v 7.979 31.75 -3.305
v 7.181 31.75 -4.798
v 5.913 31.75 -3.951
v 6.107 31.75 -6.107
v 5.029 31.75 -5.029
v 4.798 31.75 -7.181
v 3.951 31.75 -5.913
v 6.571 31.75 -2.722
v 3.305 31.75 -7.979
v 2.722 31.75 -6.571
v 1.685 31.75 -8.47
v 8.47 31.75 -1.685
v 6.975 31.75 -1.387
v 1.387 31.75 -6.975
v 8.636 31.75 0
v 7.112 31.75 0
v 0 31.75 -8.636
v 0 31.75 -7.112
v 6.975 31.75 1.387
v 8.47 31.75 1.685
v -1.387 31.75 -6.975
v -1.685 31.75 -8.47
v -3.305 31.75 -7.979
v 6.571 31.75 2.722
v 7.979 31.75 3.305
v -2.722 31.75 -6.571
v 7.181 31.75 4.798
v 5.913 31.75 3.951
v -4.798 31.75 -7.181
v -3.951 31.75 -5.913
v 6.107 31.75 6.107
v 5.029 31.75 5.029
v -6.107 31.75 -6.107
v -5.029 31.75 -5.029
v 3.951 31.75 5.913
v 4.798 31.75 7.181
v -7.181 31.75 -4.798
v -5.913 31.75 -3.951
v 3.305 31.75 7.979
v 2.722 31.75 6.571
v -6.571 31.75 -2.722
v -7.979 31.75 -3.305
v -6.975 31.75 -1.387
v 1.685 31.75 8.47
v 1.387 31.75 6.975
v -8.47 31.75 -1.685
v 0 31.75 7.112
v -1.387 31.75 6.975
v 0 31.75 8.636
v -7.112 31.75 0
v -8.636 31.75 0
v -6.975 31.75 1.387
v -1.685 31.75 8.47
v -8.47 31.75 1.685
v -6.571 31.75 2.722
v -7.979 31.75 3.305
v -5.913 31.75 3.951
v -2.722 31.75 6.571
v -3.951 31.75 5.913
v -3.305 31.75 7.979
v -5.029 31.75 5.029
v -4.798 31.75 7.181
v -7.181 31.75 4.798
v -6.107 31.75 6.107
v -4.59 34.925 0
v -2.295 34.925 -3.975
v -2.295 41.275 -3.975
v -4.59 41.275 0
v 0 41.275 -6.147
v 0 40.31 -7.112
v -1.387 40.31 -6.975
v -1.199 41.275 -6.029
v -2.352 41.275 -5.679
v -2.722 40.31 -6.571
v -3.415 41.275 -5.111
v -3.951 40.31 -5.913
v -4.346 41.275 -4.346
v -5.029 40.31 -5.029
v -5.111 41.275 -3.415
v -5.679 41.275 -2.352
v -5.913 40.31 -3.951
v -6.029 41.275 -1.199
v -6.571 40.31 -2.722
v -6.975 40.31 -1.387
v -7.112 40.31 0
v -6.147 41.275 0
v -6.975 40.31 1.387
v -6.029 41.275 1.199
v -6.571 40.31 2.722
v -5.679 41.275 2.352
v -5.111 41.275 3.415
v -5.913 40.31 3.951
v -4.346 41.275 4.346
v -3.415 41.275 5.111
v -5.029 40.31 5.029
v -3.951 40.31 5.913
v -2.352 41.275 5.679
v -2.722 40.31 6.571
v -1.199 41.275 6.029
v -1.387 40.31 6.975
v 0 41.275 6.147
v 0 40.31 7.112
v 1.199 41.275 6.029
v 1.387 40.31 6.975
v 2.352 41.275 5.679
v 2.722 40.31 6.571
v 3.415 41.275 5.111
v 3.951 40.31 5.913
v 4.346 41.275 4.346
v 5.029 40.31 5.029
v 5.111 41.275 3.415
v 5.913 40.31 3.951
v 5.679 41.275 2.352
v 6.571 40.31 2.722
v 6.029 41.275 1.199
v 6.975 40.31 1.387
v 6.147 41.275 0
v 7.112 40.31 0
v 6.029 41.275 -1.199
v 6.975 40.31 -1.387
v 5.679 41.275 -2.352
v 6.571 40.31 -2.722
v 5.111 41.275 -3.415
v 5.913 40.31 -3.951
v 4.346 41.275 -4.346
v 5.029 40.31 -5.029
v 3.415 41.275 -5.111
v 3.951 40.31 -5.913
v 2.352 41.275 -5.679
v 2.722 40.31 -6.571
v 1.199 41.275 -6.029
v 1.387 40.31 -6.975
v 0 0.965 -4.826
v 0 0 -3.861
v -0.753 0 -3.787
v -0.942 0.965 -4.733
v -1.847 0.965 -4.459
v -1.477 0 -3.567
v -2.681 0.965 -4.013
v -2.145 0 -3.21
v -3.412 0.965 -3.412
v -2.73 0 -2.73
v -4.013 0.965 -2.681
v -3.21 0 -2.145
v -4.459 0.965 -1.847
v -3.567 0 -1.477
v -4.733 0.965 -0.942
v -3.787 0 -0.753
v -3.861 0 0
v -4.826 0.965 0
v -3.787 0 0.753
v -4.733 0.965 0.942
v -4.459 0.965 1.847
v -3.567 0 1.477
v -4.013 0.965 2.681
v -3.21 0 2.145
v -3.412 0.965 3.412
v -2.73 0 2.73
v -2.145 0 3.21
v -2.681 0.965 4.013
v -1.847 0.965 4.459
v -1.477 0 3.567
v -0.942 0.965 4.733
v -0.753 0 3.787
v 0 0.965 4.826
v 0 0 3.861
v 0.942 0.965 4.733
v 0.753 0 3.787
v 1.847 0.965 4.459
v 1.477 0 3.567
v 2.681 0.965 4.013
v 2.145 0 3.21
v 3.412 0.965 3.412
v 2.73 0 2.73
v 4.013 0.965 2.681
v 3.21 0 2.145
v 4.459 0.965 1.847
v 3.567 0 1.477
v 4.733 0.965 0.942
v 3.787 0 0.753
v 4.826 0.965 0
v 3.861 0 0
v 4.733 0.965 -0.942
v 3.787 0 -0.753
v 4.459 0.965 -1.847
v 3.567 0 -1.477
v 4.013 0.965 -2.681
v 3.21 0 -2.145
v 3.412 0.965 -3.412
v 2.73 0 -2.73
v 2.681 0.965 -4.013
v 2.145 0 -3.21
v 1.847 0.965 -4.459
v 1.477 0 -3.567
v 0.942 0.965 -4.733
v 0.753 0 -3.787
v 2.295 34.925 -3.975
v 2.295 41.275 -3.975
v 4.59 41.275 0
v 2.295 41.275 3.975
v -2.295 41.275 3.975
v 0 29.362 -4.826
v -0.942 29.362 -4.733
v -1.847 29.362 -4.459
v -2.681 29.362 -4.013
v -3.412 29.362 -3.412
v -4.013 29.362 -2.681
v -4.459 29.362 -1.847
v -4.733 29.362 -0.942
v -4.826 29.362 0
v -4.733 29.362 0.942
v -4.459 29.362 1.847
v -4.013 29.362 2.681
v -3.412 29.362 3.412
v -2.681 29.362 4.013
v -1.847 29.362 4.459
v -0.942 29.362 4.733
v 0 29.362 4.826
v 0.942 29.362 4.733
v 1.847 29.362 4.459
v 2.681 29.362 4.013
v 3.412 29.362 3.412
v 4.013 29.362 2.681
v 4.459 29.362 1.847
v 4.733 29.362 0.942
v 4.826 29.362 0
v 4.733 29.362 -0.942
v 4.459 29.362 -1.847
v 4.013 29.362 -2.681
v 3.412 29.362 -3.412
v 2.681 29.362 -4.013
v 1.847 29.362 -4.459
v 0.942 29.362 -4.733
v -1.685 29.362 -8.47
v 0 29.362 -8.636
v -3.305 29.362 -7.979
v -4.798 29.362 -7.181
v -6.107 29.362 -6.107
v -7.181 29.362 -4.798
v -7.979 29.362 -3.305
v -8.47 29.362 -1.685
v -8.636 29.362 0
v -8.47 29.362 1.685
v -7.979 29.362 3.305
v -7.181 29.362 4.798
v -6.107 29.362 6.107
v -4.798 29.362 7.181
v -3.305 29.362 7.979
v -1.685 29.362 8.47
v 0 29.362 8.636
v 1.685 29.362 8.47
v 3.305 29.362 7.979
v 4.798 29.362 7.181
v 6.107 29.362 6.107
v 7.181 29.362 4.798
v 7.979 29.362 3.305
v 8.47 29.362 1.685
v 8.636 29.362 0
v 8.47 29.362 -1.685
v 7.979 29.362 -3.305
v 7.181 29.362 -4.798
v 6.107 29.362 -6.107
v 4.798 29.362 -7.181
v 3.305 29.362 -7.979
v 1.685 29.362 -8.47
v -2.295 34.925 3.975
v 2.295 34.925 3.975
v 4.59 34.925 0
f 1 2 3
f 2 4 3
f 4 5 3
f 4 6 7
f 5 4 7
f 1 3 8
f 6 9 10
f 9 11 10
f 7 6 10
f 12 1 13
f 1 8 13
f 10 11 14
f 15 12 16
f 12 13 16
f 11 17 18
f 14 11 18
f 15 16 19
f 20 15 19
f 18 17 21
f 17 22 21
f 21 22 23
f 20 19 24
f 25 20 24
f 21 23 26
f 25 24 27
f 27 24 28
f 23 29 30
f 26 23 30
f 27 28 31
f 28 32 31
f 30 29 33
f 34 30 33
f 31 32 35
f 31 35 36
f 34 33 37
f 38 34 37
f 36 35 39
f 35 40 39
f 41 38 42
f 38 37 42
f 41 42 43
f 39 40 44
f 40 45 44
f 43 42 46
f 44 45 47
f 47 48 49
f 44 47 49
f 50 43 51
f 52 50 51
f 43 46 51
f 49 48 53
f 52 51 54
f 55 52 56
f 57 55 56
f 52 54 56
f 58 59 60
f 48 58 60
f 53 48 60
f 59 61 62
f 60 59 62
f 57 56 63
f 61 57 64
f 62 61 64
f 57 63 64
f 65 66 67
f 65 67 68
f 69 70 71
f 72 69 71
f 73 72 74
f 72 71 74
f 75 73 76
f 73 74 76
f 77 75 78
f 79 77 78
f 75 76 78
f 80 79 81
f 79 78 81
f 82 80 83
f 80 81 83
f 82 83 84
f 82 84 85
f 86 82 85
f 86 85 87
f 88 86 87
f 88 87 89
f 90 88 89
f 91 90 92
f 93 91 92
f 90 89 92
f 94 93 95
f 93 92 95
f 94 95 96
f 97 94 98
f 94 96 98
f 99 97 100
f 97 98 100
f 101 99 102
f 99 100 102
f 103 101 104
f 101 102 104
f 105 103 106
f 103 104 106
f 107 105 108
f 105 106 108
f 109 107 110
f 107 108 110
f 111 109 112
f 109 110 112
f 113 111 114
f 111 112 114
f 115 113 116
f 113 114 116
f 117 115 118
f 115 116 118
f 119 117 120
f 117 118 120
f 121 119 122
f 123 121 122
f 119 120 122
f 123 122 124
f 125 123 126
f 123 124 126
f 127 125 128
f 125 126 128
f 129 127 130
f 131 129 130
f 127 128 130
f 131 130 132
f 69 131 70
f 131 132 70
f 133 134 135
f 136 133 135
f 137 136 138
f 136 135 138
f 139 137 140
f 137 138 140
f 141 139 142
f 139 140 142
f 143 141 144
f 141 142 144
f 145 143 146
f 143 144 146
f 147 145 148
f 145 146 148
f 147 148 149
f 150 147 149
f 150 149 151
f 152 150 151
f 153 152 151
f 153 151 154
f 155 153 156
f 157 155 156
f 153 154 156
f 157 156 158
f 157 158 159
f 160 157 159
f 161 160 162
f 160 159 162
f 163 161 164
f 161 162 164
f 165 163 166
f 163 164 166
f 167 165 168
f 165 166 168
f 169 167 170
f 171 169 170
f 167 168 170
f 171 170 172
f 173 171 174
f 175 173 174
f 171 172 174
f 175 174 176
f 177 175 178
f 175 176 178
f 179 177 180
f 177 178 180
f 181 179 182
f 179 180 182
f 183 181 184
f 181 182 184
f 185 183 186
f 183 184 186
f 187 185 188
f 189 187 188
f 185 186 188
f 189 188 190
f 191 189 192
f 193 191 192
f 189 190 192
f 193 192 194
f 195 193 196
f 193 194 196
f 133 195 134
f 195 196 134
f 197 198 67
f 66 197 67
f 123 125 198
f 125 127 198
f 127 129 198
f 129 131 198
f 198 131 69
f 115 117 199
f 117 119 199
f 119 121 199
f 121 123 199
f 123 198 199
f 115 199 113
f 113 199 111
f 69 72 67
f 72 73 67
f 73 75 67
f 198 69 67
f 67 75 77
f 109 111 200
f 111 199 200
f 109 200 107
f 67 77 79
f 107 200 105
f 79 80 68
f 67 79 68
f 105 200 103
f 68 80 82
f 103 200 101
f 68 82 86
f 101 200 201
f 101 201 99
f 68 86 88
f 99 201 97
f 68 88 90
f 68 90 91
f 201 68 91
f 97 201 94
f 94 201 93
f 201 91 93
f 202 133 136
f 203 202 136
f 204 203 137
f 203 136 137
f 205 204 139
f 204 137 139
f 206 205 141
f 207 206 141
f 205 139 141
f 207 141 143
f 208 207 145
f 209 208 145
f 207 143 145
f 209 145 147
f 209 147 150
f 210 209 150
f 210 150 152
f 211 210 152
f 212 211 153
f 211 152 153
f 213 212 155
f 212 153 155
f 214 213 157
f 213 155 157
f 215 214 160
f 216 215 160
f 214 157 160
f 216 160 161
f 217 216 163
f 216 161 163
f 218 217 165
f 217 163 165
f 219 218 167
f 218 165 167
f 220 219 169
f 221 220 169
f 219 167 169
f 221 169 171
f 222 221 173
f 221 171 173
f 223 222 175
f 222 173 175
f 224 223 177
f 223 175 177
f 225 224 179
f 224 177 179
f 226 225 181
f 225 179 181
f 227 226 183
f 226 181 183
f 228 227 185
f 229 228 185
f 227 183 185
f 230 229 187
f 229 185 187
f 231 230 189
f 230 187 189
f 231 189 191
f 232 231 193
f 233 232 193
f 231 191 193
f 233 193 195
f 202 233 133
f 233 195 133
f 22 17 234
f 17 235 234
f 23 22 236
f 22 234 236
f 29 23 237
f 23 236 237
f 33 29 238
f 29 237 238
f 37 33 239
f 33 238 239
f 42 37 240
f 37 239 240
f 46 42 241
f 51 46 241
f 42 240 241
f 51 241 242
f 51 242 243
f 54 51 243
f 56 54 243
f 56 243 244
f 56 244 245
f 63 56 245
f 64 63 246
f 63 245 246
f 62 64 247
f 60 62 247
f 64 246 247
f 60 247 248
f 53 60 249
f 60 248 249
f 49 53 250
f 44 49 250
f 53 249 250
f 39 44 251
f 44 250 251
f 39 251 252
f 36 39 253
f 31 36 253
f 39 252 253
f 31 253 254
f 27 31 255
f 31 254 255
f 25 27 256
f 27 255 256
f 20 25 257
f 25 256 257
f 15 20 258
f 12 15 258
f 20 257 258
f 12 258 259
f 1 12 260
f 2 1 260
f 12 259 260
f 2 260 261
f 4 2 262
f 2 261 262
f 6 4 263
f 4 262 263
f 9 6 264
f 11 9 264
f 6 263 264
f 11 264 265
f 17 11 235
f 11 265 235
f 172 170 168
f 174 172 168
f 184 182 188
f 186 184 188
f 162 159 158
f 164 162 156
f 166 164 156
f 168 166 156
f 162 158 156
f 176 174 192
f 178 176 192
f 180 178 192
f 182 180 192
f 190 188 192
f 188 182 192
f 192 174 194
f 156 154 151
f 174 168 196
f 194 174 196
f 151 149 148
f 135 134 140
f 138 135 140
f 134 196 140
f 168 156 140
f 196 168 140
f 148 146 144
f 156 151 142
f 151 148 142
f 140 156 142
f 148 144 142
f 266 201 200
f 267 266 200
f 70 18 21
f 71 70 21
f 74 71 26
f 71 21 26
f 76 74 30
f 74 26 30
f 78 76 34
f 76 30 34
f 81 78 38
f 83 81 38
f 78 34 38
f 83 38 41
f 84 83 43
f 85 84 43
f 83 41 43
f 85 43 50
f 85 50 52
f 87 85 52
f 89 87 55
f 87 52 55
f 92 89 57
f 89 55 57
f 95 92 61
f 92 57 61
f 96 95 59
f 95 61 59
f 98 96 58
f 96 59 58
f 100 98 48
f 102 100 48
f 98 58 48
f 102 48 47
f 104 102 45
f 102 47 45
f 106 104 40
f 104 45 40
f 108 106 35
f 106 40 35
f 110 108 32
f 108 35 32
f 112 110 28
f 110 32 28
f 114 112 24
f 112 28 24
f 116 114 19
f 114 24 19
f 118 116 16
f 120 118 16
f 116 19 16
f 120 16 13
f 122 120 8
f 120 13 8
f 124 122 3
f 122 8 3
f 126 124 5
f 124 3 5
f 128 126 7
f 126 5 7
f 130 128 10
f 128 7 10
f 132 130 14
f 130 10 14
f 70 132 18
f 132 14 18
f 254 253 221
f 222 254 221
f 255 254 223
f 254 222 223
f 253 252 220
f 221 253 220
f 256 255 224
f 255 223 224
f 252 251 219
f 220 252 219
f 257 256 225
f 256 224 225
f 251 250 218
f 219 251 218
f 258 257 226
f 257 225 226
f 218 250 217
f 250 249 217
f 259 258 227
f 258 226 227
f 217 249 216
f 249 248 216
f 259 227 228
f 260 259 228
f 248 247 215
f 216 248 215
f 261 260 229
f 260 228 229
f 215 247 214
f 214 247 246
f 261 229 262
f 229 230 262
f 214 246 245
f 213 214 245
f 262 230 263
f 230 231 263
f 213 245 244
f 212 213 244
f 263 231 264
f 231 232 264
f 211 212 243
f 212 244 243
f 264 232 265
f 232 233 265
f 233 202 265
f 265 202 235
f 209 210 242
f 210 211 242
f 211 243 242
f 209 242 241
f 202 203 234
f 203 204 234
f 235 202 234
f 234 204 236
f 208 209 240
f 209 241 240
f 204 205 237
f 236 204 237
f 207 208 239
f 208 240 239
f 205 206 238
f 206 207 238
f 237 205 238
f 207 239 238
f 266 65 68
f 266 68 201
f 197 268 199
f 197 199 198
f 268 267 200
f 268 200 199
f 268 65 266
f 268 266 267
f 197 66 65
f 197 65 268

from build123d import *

# Parameters (mm, degrees)
CORTAR_EXTRUIR1_DEPTH = 6.35
CHAFL_N1_SIZE         = 0.9652


with BuildPart() as part:
    # Croquis1 → Revolución1 (revolve)
    with BuildSketch(Plane.XY, mode=Mode.PRIVATE) as revoluci_n1_sk:
        Polygon((0, 41.275), (7.112, 41.275), (7.112, 31.75), (8.636, 31.75), (8.636, 29.3624), (4.826, 29.3624), (4.826, 0), (0, 0), align=None)
    revolve(revoluci_n1_sk.sketch.rotate(Axis((0, 0, 0), (0, 1, 0)), 90), axis=Axis((0, 0, 0), (0, 1, 0)))

    # Croquis2 → Cortar-Extruir1 (cut)
    with BuildSketch(Plane(origin=(0, 41.275, 0), x_dir=(1, 0, 0), z_dir=(0, 1, 0))):
        Polygon((-2.295025055, 3.9751), (-4.59005011, 0), (-2.295025055, -3.9751), (2.295025055, -3.9751), (4.59005011, 0), (2.295025055, 3.9751), align=None)
    extrude(amount=-CORTAR_EXTRUIR1_DEPTH, mode=Mode.SUBTRACT)

    # Chaflán1
    chafl_n1_edges = [part.edges().sort_by_distance(p)[0] for p in [
        (0, 0, 4.826),
        (0, 41.275, 7.112),
    ]]
    chamfer(chafl_n1_edges, length=CHAFL_N1_SIZE)


solid = part.part
